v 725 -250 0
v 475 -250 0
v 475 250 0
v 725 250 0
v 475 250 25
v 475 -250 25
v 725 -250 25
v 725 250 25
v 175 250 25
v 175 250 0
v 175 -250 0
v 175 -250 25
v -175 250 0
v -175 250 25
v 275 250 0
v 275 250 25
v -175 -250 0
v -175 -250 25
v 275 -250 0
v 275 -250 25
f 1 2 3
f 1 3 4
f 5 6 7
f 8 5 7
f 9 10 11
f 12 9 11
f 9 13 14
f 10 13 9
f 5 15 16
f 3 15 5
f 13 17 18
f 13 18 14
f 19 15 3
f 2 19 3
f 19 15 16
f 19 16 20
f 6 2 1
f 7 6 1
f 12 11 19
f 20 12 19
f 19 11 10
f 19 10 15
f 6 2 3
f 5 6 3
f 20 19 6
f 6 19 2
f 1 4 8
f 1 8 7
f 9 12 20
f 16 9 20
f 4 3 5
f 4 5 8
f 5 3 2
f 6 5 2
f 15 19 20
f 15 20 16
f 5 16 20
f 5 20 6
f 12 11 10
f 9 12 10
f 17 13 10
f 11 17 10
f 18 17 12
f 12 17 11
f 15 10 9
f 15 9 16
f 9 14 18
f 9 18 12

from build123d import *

# Parameters (mm, degrees)
F0_W     = 350
F0_H     = 500
F1_DEPTH = 25
F2_W     = 100
F2_H     = 500
F3_DEPTH = 25
F4_W     = 200
F4_H     = 500
F5_DEPTH = 25
F6_W     = 250
F6_H     = 500
F7_DEPTH = 25


with BuildPart() as f1:
    # F0 (on Top) → F1 (new body)
    with BuildSketch(Plane.XY):
        Rectangle(F0_W, F0_H)
    extrude(amount=F1_DEPTH)


with BuildPart() as f3:
    # F2 (on face) → F3 (new body)
    with BuildSketch(Plane(origin=(0, 0, 0), x_dir=(1, 0, 0), z_dir=(0, 0, -1))):
        with Locations((225, 0)):
            Rectangle(F2_W, F2_H)
    extrude(amount=-F3_DEPTH)


with BuildPart() as f5:
    # F4 (on Top) → F5 (new body)
    with BuildSketch(Plane.XY):
        with Locations((375, 0)):
            Rectangle(F4_W, F4_H)
    extrude(amount=F5_DEPTH)


with BuildPart() as f7:
    # F6 (on face) → F7 (new body)
    with BuildSketch(Plane(origin=(0, 0, 0), x_dir=(1, 0, 0), z_dir=(0, 0, -1))):
        with Locations((600, 0)):
            Rectangle(F6_W, F6_H)
    extrude(amount=-F7_DEPTH)


solid = Compound([f1.part, f3.part, f5.part, f7.part])
